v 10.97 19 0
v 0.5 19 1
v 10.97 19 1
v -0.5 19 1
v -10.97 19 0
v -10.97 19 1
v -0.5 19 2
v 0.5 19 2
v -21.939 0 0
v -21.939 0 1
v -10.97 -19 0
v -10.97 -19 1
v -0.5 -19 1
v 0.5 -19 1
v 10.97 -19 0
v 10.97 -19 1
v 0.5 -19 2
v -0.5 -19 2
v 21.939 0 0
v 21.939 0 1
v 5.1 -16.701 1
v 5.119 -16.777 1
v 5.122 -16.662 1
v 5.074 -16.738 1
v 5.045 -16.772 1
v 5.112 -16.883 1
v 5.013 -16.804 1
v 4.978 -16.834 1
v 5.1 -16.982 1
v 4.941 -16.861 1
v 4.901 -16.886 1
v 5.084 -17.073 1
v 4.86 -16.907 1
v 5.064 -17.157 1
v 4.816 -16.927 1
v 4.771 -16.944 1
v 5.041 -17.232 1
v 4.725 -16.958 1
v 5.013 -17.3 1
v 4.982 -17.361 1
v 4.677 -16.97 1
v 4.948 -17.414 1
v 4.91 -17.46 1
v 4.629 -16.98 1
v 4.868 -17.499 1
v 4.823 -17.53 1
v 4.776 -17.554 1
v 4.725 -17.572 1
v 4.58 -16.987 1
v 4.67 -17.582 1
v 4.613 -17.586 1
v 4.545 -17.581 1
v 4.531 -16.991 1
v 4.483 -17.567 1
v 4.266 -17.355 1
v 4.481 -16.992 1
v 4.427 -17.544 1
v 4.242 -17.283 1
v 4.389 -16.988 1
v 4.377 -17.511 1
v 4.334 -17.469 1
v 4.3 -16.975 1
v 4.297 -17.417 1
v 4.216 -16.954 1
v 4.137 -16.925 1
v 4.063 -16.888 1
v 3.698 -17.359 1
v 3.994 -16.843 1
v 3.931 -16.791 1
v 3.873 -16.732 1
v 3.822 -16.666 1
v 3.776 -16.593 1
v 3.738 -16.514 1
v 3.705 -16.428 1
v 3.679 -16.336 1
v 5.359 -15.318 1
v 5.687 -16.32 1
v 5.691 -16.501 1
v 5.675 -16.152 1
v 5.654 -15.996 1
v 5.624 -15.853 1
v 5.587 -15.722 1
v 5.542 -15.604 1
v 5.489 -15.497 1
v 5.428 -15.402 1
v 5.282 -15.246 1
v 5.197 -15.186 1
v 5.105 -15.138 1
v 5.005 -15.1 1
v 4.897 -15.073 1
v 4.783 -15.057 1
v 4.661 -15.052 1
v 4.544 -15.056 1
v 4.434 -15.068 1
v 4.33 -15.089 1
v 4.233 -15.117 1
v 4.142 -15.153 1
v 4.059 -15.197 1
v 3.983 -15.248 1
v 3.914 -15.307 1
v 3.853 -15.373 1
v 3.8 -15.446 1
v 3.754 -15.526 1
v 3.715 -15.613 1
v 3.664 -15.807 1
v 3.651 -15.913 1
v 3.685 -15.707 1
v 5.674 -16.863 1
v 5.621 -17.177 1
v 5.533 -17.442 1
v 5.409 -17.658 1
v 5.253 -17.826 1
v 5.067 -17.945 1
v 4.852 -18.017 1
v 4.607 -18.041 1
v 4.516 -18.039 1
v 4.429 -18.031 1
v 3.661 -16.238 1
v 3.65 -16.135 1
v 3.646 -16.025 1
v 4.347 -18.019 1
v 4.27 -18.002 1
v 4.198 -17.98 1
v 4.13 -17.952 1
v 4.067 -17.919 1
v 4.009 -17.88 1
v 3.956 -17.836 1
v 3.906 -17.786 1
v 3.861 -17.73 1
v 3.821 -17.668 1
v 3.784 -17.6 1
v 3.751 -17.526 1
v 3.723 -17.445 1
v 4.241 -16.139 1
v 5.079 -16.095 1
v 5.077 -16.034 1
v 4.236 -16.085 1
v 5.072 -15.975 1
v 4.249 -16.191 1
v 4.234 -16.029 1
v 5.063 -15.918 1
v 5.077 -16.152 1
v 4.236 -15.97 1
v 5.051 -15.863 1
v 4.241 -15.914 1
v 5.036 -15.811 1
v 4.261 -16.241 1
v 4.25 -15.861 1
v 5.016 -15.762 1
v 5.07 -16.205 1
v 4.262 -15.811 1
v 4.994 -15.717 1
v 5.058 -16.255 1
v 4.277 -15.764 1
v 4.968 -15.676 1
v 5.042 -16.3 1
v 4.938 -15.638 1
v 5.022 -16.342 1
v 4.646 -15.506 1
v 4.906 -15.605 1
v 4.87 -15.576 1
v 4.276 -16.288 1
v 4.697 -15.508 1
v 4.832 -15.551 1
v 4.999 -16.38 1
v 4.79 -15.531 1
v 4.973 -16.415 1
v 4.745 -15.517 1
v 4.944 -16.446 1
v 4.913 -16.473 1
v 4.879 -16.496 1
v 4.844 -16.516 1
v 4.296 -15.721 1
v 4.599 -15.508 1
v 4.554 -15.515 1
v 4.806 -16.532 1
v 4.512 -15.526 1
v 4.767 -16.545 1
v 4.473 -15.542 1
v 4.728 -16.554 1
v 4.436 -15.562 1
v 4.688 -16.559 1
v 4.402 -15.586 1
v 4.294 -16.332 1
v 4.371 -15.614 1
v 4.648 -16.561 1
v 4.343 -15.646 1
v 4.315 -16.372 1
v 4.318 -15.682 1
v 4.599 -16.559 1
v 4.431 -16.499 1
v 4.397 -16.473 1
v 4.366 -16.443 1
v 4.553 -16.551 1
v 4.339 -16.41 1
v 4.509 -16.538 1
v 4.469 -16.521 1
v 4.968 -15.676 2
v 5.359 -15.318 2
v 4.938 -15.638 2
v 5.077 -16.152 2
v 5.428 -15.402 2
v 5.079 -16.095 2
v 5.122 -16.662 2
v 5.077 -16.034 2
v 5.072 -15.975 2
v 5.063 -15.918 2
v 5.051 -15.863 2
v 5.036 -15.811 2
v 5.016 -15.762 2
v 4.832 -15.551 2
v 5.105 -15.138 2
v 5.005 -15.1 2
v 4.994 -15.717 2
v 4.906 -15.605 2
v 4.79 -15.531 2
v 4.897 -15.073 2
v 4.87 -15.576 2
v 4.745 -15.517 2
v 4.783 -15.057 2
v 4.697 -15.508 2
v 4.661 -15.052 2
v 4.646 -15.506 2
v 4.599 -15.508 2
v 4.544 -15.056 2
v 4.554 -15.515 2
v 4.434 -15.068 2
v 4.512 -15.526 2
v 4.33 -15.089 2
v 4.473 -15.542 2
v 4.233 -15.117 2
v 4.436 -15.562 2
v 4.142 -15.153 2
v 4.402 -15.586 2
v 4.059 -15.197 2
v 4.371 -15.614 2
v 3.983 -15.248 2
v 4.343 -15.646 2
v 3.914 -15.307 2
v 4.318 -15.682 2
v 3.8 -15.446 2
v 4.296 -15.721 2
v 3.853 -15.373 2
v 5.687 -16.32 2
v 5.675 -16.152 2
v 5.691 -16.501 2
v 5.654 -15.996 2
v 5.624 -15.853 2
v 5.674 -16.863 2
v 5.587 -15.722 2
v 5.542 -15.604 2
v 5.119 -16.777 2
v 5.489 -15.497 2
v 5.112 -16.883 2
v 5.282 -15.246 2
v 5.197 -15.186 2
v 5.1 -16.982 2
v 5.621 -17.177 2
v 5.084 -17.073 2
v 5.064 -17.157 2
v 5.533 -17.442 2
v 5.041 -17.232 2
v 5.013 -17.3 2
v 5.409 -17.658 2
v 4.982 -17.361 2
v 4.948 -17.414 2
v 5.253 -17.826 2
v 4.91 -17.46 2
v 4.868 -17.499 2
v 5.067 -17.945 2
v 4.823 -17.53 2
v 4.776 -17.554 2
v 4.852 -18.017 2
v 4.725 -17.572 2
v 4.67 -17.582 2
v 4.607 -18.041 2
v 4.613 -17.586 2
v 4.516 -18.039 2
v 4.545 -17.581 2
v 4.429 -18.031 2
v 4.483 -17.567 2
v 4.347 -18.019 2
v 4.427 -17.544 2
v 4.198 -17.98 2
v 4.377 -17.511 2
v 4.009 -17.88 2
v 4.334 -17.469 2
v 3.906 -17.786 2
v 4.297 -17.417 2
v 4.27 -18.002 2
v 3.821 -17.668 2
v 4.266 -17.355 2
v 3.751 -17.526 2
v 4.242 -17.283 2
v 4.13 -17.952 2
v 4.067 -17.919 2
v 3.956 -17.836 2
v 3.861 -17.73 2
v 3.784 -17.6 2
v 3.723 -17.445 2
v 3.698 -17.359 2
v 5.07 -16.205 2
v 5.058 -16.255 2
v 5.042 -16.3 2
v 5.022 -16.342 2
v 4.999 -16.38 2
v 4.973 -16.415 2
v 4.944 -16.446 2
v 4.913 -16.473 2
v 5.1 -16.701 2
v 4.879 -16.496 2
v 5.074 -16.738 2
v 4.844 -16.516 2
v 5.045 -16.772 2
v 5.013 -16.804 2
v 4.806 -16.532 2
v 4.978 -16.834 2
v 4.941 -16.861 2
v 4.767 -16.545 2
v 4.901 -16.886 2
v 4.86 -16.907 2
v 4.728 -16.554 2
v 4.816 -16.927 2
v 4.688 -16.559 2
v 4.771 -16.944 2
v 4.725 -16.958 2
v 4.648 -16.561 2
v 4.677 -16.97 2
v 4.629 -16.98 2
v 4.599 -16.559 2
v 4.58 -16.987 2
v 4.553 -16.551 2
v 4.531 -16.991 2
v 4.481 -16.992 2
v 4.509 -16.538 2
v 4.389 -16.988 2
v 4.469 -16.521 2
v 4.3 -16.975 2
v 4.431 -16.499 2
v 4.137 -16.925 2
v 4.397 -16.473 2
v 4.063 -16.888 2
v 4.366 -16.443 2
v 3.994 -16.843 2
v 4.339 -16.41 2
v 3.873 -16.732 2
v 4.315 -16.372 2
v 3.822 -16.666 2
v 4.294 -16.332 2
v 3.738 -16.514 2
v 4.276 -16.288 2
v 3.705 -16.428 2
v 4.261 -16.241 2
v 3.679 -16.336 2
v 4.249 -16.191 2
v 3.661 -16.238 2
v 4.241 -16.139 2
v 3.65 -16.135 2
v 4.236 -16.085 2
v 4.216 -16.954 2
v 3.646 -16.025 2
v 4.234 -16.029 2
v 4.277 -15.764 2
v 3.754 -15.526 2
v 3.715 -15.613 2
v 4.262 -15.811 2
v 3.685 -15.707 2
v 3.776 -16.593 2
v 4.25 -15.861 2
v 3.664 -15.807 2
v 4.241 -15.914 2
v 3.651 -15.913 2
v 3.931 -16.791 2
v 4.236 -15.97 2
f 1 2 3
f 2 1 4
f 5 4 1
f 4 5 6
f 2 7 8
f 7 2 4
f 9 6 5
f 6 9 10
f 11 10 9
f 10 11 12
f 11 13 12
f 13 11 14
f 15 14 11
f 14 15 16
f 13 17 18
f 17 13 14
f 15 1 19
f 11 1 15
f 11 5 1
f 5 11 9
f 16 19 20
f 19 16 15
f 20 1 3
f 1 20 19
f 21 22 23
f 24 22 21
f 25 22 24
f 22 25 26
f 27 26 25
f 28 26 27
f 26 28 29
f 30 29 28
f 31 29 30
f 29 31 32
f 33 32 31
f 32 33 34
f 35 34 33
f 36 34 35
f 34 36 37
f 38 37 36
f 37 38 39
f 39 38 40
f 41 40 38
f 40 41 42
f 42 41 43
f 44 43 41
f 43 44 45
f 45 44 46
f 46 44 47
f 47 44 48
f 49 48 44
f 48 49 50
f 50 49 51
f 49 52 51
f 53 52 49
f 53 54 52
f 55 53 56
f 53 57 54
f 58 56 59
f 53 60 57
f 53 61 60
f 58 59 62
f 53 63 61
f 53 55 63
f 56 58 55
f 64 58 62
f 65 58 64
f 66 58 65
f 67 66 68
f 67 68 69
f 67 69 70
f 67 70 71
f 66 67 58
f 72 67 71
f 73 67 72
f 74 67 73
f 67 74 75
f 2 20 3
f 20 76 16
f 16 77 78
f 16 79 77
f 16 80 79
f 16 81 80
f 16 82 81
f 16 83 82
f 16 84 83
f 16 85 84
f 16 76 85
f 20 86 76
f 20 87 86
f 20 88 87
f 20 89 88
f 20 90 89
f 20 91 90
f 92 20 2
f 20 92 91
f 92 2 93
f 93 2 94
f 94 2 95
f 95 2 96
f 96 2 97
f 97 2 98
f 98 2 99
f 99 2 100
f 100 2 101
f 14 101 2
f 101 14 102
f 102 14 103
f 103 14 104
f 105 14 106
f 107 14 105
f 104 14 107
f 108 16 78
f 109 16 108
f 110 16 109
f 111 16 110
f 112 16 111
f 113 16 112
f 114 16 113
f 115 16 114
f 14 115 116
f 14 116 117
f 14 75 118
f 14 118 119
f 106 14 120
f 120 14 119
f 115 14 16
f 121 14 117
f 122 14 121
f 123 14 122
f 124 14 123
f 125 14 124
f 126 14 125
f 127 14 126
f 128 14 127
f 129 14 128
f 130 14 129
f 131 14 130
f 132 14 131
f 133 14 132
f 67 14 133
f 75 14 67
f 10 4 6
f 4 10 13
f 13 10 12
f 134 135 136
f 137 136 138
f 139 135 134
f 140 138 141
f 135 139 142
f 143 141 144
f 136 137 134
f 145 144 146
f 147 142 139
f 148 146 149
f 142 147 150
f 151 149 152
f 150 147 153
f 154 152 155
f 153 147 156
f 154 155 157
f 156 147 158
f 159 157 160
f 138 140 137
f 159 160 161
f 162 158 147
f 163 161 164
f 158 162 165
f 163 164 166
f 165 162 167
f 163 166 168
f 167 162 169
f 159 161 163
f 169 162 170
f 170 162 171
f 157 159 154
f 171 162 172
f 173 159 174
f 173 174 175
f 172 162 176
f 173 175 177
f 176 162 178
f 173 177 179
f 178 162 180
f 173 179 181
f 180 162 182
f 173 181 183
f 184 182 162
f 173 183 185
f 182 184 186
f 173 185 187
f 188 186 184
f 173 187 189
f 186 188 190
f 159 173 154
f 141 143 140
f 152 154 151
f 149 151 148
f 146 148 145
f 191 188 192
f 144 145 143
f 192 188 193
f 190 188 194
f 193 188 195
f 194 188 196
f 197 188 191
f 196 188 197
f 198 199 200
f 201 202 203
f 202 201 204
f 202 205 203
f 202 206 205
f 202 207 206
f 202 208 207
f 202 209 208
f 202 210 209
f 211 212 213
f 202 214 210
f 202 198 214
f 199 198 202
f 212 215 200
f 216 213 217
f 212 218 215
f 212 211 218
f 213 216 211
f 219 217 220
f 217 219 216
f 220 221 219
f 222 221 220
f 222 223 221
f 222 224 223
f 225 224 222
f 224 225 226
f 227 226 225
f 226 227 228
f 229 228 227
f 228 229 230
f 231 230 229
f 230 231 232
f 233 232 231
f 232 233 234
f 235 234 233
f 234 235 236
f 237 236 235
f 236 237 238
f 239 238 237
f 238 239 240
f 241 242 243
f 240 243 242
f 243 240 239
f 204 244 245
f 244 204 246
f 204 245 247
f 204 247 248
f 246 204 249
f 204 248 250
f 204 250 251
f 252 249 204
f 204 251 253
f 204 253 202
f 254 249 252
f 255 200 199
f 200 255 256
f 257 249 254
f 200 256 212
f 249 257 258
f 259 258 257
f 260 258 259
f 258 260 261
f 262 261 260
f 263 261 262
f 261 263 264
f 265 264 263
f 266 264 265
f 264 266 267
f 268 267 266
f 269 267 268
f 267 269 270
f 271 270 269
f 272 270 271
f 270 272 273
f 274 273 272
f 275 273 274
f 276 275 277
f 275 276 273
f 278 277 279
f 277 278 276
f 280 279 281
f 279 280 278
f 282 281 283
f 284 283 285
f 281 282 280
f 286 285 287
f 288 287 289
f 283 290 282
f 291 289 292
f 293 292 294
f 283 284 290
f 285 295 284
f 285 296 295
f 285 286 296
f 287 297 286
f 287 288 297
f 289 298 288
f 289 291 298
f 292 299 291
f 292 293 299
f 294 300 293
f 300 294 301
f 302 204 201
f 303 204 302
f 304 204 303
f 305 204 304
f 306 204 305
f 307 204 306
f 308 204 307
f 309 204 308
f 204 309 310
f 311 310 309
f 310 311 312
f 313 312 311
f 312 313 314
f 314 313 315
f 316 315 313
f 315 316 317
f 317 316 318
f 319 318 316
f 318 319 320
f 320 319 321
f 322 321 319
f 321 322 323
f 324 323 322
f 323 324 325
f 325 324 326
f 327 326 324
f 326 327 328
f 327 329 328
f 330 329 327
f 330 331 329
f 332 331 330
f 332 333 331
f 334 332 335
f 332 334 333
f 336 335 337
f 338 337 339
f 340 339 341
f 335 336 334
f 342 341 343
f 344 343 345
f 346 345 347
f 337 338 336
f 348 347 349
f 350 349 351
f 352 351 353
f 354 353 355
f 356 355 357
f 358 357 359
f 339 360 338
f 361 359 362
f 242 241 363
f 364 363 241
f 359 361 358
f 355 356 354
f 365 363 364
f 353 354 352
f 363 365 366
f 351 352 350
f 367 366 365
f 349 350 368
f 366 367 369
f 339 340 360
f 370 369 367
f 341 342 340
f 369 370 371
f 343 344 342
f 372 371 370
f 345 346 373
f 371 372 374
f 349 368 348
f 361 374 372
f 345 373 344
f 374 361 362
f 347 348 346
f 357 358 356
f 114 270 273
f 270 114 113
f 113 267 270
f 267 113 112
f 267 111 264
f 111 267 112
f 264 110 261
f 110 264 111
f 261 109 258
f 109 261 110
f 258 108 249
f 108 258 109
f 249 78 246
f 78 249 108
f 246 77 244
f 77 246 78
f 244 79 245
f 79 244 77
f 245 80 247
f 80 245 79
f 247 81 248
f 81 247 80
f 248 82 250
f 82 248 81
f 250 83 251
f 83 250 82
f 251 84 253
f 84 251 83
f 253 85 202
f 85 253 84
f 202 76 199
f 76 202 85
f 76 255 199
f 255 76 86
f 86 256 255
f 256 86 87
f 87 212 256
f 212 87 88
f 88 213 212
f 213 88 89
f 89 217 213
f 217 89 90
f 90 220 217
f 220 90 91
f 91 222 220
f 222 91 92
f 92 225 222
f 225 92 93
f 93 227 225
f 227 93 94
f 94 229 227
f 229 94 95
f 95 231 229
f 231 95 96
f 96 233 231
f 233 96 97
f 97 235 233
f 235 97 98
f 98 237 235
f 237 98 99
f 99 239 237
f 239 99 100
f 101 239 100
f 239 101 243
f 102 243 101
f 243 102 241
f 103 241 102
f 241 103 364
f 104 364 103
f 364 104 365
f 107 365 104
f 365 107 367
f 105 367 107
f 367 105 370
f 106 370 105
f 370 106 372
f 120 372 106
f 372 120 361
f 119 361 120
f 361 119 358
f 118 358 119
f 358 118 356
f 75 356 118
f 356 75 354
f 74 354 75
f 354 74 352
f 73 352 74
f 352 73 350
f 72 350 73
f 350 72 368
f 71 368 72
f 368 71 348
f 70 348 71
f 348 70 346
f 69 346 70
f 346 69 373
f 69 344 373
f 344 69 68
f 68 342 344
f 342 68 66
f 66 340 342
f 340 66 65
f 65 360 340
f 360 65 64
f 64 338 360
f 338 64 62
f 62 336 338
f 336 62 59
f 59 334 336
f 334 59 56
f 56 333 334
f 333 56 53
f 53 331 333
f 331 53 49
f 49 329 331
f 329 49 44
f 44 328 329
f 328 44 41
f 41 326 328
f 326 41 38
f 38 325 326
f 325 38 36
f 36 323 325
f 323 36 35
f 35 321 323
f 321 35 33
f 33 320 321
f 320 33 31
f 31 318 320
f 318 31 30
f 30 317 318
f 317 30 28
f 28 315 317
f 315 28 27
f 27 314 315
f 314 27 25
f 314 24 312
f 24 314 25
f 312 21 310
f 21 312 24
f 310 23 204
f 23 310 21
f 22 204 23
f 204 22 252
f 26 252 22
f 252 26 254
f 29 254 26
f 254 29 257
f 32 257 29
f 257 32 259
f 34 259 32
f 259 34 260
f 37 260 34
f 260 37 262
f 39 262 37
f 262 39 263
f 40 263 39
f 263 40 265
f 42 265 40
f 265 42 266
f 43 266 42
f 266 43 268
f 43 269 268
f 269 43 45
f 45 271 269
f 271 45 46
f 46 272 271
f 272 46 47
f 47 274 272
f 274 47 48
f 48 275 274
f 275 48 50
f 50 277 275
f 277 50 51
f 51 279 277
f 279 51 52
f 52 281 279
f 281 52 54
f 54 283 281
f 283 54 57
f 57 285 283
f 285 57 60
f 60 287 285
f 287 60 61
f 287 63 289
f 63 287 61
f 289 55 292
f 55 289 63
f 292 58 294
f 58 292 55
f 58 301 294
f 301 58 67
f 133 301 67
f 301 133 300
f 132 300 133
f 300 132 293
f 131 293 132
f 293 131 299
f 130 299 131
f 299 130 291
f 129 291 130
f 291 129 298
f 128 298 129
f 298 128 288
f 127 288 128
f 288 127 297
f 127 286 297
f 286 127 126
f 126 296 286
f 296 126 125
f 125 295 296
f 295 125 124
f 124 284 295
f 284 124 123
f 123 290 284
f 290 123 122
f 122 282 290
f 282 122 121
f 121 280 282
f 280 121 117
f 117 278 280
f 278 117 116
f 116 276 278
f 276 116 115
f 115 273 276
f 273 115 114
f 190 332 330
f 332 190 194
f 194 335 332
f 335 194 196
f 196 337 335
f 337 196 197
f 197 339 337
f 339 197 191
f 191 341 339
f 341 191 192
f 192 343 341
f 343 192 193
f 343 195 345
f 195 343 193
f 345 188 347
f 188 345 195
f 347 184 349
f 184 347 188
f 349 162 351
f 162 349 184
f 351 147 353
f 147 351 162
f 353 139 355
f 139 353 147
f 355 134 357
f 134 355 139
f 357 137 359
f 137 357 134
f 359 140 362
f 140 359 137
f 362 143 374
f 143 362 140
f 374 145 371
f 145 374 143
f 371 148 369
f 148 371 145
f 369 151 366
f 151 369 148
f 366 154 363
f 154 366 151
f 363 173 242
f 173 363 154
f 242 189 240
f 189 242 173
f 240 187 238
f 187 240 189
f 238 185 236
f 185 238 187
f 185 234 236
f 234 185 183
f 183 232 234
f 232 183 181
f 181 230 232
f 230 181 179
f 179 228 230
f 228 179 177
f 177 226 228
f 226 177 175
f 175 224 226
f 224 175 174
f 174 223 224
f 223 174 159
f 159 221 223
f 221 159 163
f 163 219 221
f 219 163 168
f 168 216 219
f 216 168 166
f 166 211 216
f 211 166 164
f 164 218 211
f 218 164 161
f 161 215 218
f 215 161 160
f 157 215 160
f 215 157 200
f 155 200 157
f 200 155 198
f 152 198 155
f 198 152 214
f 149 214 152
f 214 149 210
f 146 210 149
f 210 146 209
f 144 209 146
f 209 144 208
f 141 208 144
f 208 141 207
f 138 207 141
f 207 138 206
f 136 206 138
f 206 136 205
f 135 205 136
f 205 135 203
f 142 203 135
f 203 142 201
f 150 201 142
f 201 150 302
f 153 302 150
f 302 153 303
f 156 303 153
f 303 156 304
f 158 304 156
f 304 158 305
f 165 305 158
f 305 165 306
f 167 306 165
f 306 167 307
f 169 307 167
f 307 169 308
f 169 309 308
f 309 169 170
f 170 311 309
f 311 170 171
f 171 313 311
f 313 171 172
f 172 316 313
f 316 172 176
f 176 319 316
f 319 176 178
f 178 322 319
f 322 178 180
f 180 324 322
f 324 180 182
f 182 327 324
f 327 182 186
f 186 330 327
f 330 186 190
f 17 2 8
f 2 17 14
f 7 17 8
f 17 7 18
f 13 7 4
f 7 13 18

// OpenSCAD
include <../Scripts/18xx tiles basic functions.scad>
hex();
put_tilenr("9");
straight_line();
